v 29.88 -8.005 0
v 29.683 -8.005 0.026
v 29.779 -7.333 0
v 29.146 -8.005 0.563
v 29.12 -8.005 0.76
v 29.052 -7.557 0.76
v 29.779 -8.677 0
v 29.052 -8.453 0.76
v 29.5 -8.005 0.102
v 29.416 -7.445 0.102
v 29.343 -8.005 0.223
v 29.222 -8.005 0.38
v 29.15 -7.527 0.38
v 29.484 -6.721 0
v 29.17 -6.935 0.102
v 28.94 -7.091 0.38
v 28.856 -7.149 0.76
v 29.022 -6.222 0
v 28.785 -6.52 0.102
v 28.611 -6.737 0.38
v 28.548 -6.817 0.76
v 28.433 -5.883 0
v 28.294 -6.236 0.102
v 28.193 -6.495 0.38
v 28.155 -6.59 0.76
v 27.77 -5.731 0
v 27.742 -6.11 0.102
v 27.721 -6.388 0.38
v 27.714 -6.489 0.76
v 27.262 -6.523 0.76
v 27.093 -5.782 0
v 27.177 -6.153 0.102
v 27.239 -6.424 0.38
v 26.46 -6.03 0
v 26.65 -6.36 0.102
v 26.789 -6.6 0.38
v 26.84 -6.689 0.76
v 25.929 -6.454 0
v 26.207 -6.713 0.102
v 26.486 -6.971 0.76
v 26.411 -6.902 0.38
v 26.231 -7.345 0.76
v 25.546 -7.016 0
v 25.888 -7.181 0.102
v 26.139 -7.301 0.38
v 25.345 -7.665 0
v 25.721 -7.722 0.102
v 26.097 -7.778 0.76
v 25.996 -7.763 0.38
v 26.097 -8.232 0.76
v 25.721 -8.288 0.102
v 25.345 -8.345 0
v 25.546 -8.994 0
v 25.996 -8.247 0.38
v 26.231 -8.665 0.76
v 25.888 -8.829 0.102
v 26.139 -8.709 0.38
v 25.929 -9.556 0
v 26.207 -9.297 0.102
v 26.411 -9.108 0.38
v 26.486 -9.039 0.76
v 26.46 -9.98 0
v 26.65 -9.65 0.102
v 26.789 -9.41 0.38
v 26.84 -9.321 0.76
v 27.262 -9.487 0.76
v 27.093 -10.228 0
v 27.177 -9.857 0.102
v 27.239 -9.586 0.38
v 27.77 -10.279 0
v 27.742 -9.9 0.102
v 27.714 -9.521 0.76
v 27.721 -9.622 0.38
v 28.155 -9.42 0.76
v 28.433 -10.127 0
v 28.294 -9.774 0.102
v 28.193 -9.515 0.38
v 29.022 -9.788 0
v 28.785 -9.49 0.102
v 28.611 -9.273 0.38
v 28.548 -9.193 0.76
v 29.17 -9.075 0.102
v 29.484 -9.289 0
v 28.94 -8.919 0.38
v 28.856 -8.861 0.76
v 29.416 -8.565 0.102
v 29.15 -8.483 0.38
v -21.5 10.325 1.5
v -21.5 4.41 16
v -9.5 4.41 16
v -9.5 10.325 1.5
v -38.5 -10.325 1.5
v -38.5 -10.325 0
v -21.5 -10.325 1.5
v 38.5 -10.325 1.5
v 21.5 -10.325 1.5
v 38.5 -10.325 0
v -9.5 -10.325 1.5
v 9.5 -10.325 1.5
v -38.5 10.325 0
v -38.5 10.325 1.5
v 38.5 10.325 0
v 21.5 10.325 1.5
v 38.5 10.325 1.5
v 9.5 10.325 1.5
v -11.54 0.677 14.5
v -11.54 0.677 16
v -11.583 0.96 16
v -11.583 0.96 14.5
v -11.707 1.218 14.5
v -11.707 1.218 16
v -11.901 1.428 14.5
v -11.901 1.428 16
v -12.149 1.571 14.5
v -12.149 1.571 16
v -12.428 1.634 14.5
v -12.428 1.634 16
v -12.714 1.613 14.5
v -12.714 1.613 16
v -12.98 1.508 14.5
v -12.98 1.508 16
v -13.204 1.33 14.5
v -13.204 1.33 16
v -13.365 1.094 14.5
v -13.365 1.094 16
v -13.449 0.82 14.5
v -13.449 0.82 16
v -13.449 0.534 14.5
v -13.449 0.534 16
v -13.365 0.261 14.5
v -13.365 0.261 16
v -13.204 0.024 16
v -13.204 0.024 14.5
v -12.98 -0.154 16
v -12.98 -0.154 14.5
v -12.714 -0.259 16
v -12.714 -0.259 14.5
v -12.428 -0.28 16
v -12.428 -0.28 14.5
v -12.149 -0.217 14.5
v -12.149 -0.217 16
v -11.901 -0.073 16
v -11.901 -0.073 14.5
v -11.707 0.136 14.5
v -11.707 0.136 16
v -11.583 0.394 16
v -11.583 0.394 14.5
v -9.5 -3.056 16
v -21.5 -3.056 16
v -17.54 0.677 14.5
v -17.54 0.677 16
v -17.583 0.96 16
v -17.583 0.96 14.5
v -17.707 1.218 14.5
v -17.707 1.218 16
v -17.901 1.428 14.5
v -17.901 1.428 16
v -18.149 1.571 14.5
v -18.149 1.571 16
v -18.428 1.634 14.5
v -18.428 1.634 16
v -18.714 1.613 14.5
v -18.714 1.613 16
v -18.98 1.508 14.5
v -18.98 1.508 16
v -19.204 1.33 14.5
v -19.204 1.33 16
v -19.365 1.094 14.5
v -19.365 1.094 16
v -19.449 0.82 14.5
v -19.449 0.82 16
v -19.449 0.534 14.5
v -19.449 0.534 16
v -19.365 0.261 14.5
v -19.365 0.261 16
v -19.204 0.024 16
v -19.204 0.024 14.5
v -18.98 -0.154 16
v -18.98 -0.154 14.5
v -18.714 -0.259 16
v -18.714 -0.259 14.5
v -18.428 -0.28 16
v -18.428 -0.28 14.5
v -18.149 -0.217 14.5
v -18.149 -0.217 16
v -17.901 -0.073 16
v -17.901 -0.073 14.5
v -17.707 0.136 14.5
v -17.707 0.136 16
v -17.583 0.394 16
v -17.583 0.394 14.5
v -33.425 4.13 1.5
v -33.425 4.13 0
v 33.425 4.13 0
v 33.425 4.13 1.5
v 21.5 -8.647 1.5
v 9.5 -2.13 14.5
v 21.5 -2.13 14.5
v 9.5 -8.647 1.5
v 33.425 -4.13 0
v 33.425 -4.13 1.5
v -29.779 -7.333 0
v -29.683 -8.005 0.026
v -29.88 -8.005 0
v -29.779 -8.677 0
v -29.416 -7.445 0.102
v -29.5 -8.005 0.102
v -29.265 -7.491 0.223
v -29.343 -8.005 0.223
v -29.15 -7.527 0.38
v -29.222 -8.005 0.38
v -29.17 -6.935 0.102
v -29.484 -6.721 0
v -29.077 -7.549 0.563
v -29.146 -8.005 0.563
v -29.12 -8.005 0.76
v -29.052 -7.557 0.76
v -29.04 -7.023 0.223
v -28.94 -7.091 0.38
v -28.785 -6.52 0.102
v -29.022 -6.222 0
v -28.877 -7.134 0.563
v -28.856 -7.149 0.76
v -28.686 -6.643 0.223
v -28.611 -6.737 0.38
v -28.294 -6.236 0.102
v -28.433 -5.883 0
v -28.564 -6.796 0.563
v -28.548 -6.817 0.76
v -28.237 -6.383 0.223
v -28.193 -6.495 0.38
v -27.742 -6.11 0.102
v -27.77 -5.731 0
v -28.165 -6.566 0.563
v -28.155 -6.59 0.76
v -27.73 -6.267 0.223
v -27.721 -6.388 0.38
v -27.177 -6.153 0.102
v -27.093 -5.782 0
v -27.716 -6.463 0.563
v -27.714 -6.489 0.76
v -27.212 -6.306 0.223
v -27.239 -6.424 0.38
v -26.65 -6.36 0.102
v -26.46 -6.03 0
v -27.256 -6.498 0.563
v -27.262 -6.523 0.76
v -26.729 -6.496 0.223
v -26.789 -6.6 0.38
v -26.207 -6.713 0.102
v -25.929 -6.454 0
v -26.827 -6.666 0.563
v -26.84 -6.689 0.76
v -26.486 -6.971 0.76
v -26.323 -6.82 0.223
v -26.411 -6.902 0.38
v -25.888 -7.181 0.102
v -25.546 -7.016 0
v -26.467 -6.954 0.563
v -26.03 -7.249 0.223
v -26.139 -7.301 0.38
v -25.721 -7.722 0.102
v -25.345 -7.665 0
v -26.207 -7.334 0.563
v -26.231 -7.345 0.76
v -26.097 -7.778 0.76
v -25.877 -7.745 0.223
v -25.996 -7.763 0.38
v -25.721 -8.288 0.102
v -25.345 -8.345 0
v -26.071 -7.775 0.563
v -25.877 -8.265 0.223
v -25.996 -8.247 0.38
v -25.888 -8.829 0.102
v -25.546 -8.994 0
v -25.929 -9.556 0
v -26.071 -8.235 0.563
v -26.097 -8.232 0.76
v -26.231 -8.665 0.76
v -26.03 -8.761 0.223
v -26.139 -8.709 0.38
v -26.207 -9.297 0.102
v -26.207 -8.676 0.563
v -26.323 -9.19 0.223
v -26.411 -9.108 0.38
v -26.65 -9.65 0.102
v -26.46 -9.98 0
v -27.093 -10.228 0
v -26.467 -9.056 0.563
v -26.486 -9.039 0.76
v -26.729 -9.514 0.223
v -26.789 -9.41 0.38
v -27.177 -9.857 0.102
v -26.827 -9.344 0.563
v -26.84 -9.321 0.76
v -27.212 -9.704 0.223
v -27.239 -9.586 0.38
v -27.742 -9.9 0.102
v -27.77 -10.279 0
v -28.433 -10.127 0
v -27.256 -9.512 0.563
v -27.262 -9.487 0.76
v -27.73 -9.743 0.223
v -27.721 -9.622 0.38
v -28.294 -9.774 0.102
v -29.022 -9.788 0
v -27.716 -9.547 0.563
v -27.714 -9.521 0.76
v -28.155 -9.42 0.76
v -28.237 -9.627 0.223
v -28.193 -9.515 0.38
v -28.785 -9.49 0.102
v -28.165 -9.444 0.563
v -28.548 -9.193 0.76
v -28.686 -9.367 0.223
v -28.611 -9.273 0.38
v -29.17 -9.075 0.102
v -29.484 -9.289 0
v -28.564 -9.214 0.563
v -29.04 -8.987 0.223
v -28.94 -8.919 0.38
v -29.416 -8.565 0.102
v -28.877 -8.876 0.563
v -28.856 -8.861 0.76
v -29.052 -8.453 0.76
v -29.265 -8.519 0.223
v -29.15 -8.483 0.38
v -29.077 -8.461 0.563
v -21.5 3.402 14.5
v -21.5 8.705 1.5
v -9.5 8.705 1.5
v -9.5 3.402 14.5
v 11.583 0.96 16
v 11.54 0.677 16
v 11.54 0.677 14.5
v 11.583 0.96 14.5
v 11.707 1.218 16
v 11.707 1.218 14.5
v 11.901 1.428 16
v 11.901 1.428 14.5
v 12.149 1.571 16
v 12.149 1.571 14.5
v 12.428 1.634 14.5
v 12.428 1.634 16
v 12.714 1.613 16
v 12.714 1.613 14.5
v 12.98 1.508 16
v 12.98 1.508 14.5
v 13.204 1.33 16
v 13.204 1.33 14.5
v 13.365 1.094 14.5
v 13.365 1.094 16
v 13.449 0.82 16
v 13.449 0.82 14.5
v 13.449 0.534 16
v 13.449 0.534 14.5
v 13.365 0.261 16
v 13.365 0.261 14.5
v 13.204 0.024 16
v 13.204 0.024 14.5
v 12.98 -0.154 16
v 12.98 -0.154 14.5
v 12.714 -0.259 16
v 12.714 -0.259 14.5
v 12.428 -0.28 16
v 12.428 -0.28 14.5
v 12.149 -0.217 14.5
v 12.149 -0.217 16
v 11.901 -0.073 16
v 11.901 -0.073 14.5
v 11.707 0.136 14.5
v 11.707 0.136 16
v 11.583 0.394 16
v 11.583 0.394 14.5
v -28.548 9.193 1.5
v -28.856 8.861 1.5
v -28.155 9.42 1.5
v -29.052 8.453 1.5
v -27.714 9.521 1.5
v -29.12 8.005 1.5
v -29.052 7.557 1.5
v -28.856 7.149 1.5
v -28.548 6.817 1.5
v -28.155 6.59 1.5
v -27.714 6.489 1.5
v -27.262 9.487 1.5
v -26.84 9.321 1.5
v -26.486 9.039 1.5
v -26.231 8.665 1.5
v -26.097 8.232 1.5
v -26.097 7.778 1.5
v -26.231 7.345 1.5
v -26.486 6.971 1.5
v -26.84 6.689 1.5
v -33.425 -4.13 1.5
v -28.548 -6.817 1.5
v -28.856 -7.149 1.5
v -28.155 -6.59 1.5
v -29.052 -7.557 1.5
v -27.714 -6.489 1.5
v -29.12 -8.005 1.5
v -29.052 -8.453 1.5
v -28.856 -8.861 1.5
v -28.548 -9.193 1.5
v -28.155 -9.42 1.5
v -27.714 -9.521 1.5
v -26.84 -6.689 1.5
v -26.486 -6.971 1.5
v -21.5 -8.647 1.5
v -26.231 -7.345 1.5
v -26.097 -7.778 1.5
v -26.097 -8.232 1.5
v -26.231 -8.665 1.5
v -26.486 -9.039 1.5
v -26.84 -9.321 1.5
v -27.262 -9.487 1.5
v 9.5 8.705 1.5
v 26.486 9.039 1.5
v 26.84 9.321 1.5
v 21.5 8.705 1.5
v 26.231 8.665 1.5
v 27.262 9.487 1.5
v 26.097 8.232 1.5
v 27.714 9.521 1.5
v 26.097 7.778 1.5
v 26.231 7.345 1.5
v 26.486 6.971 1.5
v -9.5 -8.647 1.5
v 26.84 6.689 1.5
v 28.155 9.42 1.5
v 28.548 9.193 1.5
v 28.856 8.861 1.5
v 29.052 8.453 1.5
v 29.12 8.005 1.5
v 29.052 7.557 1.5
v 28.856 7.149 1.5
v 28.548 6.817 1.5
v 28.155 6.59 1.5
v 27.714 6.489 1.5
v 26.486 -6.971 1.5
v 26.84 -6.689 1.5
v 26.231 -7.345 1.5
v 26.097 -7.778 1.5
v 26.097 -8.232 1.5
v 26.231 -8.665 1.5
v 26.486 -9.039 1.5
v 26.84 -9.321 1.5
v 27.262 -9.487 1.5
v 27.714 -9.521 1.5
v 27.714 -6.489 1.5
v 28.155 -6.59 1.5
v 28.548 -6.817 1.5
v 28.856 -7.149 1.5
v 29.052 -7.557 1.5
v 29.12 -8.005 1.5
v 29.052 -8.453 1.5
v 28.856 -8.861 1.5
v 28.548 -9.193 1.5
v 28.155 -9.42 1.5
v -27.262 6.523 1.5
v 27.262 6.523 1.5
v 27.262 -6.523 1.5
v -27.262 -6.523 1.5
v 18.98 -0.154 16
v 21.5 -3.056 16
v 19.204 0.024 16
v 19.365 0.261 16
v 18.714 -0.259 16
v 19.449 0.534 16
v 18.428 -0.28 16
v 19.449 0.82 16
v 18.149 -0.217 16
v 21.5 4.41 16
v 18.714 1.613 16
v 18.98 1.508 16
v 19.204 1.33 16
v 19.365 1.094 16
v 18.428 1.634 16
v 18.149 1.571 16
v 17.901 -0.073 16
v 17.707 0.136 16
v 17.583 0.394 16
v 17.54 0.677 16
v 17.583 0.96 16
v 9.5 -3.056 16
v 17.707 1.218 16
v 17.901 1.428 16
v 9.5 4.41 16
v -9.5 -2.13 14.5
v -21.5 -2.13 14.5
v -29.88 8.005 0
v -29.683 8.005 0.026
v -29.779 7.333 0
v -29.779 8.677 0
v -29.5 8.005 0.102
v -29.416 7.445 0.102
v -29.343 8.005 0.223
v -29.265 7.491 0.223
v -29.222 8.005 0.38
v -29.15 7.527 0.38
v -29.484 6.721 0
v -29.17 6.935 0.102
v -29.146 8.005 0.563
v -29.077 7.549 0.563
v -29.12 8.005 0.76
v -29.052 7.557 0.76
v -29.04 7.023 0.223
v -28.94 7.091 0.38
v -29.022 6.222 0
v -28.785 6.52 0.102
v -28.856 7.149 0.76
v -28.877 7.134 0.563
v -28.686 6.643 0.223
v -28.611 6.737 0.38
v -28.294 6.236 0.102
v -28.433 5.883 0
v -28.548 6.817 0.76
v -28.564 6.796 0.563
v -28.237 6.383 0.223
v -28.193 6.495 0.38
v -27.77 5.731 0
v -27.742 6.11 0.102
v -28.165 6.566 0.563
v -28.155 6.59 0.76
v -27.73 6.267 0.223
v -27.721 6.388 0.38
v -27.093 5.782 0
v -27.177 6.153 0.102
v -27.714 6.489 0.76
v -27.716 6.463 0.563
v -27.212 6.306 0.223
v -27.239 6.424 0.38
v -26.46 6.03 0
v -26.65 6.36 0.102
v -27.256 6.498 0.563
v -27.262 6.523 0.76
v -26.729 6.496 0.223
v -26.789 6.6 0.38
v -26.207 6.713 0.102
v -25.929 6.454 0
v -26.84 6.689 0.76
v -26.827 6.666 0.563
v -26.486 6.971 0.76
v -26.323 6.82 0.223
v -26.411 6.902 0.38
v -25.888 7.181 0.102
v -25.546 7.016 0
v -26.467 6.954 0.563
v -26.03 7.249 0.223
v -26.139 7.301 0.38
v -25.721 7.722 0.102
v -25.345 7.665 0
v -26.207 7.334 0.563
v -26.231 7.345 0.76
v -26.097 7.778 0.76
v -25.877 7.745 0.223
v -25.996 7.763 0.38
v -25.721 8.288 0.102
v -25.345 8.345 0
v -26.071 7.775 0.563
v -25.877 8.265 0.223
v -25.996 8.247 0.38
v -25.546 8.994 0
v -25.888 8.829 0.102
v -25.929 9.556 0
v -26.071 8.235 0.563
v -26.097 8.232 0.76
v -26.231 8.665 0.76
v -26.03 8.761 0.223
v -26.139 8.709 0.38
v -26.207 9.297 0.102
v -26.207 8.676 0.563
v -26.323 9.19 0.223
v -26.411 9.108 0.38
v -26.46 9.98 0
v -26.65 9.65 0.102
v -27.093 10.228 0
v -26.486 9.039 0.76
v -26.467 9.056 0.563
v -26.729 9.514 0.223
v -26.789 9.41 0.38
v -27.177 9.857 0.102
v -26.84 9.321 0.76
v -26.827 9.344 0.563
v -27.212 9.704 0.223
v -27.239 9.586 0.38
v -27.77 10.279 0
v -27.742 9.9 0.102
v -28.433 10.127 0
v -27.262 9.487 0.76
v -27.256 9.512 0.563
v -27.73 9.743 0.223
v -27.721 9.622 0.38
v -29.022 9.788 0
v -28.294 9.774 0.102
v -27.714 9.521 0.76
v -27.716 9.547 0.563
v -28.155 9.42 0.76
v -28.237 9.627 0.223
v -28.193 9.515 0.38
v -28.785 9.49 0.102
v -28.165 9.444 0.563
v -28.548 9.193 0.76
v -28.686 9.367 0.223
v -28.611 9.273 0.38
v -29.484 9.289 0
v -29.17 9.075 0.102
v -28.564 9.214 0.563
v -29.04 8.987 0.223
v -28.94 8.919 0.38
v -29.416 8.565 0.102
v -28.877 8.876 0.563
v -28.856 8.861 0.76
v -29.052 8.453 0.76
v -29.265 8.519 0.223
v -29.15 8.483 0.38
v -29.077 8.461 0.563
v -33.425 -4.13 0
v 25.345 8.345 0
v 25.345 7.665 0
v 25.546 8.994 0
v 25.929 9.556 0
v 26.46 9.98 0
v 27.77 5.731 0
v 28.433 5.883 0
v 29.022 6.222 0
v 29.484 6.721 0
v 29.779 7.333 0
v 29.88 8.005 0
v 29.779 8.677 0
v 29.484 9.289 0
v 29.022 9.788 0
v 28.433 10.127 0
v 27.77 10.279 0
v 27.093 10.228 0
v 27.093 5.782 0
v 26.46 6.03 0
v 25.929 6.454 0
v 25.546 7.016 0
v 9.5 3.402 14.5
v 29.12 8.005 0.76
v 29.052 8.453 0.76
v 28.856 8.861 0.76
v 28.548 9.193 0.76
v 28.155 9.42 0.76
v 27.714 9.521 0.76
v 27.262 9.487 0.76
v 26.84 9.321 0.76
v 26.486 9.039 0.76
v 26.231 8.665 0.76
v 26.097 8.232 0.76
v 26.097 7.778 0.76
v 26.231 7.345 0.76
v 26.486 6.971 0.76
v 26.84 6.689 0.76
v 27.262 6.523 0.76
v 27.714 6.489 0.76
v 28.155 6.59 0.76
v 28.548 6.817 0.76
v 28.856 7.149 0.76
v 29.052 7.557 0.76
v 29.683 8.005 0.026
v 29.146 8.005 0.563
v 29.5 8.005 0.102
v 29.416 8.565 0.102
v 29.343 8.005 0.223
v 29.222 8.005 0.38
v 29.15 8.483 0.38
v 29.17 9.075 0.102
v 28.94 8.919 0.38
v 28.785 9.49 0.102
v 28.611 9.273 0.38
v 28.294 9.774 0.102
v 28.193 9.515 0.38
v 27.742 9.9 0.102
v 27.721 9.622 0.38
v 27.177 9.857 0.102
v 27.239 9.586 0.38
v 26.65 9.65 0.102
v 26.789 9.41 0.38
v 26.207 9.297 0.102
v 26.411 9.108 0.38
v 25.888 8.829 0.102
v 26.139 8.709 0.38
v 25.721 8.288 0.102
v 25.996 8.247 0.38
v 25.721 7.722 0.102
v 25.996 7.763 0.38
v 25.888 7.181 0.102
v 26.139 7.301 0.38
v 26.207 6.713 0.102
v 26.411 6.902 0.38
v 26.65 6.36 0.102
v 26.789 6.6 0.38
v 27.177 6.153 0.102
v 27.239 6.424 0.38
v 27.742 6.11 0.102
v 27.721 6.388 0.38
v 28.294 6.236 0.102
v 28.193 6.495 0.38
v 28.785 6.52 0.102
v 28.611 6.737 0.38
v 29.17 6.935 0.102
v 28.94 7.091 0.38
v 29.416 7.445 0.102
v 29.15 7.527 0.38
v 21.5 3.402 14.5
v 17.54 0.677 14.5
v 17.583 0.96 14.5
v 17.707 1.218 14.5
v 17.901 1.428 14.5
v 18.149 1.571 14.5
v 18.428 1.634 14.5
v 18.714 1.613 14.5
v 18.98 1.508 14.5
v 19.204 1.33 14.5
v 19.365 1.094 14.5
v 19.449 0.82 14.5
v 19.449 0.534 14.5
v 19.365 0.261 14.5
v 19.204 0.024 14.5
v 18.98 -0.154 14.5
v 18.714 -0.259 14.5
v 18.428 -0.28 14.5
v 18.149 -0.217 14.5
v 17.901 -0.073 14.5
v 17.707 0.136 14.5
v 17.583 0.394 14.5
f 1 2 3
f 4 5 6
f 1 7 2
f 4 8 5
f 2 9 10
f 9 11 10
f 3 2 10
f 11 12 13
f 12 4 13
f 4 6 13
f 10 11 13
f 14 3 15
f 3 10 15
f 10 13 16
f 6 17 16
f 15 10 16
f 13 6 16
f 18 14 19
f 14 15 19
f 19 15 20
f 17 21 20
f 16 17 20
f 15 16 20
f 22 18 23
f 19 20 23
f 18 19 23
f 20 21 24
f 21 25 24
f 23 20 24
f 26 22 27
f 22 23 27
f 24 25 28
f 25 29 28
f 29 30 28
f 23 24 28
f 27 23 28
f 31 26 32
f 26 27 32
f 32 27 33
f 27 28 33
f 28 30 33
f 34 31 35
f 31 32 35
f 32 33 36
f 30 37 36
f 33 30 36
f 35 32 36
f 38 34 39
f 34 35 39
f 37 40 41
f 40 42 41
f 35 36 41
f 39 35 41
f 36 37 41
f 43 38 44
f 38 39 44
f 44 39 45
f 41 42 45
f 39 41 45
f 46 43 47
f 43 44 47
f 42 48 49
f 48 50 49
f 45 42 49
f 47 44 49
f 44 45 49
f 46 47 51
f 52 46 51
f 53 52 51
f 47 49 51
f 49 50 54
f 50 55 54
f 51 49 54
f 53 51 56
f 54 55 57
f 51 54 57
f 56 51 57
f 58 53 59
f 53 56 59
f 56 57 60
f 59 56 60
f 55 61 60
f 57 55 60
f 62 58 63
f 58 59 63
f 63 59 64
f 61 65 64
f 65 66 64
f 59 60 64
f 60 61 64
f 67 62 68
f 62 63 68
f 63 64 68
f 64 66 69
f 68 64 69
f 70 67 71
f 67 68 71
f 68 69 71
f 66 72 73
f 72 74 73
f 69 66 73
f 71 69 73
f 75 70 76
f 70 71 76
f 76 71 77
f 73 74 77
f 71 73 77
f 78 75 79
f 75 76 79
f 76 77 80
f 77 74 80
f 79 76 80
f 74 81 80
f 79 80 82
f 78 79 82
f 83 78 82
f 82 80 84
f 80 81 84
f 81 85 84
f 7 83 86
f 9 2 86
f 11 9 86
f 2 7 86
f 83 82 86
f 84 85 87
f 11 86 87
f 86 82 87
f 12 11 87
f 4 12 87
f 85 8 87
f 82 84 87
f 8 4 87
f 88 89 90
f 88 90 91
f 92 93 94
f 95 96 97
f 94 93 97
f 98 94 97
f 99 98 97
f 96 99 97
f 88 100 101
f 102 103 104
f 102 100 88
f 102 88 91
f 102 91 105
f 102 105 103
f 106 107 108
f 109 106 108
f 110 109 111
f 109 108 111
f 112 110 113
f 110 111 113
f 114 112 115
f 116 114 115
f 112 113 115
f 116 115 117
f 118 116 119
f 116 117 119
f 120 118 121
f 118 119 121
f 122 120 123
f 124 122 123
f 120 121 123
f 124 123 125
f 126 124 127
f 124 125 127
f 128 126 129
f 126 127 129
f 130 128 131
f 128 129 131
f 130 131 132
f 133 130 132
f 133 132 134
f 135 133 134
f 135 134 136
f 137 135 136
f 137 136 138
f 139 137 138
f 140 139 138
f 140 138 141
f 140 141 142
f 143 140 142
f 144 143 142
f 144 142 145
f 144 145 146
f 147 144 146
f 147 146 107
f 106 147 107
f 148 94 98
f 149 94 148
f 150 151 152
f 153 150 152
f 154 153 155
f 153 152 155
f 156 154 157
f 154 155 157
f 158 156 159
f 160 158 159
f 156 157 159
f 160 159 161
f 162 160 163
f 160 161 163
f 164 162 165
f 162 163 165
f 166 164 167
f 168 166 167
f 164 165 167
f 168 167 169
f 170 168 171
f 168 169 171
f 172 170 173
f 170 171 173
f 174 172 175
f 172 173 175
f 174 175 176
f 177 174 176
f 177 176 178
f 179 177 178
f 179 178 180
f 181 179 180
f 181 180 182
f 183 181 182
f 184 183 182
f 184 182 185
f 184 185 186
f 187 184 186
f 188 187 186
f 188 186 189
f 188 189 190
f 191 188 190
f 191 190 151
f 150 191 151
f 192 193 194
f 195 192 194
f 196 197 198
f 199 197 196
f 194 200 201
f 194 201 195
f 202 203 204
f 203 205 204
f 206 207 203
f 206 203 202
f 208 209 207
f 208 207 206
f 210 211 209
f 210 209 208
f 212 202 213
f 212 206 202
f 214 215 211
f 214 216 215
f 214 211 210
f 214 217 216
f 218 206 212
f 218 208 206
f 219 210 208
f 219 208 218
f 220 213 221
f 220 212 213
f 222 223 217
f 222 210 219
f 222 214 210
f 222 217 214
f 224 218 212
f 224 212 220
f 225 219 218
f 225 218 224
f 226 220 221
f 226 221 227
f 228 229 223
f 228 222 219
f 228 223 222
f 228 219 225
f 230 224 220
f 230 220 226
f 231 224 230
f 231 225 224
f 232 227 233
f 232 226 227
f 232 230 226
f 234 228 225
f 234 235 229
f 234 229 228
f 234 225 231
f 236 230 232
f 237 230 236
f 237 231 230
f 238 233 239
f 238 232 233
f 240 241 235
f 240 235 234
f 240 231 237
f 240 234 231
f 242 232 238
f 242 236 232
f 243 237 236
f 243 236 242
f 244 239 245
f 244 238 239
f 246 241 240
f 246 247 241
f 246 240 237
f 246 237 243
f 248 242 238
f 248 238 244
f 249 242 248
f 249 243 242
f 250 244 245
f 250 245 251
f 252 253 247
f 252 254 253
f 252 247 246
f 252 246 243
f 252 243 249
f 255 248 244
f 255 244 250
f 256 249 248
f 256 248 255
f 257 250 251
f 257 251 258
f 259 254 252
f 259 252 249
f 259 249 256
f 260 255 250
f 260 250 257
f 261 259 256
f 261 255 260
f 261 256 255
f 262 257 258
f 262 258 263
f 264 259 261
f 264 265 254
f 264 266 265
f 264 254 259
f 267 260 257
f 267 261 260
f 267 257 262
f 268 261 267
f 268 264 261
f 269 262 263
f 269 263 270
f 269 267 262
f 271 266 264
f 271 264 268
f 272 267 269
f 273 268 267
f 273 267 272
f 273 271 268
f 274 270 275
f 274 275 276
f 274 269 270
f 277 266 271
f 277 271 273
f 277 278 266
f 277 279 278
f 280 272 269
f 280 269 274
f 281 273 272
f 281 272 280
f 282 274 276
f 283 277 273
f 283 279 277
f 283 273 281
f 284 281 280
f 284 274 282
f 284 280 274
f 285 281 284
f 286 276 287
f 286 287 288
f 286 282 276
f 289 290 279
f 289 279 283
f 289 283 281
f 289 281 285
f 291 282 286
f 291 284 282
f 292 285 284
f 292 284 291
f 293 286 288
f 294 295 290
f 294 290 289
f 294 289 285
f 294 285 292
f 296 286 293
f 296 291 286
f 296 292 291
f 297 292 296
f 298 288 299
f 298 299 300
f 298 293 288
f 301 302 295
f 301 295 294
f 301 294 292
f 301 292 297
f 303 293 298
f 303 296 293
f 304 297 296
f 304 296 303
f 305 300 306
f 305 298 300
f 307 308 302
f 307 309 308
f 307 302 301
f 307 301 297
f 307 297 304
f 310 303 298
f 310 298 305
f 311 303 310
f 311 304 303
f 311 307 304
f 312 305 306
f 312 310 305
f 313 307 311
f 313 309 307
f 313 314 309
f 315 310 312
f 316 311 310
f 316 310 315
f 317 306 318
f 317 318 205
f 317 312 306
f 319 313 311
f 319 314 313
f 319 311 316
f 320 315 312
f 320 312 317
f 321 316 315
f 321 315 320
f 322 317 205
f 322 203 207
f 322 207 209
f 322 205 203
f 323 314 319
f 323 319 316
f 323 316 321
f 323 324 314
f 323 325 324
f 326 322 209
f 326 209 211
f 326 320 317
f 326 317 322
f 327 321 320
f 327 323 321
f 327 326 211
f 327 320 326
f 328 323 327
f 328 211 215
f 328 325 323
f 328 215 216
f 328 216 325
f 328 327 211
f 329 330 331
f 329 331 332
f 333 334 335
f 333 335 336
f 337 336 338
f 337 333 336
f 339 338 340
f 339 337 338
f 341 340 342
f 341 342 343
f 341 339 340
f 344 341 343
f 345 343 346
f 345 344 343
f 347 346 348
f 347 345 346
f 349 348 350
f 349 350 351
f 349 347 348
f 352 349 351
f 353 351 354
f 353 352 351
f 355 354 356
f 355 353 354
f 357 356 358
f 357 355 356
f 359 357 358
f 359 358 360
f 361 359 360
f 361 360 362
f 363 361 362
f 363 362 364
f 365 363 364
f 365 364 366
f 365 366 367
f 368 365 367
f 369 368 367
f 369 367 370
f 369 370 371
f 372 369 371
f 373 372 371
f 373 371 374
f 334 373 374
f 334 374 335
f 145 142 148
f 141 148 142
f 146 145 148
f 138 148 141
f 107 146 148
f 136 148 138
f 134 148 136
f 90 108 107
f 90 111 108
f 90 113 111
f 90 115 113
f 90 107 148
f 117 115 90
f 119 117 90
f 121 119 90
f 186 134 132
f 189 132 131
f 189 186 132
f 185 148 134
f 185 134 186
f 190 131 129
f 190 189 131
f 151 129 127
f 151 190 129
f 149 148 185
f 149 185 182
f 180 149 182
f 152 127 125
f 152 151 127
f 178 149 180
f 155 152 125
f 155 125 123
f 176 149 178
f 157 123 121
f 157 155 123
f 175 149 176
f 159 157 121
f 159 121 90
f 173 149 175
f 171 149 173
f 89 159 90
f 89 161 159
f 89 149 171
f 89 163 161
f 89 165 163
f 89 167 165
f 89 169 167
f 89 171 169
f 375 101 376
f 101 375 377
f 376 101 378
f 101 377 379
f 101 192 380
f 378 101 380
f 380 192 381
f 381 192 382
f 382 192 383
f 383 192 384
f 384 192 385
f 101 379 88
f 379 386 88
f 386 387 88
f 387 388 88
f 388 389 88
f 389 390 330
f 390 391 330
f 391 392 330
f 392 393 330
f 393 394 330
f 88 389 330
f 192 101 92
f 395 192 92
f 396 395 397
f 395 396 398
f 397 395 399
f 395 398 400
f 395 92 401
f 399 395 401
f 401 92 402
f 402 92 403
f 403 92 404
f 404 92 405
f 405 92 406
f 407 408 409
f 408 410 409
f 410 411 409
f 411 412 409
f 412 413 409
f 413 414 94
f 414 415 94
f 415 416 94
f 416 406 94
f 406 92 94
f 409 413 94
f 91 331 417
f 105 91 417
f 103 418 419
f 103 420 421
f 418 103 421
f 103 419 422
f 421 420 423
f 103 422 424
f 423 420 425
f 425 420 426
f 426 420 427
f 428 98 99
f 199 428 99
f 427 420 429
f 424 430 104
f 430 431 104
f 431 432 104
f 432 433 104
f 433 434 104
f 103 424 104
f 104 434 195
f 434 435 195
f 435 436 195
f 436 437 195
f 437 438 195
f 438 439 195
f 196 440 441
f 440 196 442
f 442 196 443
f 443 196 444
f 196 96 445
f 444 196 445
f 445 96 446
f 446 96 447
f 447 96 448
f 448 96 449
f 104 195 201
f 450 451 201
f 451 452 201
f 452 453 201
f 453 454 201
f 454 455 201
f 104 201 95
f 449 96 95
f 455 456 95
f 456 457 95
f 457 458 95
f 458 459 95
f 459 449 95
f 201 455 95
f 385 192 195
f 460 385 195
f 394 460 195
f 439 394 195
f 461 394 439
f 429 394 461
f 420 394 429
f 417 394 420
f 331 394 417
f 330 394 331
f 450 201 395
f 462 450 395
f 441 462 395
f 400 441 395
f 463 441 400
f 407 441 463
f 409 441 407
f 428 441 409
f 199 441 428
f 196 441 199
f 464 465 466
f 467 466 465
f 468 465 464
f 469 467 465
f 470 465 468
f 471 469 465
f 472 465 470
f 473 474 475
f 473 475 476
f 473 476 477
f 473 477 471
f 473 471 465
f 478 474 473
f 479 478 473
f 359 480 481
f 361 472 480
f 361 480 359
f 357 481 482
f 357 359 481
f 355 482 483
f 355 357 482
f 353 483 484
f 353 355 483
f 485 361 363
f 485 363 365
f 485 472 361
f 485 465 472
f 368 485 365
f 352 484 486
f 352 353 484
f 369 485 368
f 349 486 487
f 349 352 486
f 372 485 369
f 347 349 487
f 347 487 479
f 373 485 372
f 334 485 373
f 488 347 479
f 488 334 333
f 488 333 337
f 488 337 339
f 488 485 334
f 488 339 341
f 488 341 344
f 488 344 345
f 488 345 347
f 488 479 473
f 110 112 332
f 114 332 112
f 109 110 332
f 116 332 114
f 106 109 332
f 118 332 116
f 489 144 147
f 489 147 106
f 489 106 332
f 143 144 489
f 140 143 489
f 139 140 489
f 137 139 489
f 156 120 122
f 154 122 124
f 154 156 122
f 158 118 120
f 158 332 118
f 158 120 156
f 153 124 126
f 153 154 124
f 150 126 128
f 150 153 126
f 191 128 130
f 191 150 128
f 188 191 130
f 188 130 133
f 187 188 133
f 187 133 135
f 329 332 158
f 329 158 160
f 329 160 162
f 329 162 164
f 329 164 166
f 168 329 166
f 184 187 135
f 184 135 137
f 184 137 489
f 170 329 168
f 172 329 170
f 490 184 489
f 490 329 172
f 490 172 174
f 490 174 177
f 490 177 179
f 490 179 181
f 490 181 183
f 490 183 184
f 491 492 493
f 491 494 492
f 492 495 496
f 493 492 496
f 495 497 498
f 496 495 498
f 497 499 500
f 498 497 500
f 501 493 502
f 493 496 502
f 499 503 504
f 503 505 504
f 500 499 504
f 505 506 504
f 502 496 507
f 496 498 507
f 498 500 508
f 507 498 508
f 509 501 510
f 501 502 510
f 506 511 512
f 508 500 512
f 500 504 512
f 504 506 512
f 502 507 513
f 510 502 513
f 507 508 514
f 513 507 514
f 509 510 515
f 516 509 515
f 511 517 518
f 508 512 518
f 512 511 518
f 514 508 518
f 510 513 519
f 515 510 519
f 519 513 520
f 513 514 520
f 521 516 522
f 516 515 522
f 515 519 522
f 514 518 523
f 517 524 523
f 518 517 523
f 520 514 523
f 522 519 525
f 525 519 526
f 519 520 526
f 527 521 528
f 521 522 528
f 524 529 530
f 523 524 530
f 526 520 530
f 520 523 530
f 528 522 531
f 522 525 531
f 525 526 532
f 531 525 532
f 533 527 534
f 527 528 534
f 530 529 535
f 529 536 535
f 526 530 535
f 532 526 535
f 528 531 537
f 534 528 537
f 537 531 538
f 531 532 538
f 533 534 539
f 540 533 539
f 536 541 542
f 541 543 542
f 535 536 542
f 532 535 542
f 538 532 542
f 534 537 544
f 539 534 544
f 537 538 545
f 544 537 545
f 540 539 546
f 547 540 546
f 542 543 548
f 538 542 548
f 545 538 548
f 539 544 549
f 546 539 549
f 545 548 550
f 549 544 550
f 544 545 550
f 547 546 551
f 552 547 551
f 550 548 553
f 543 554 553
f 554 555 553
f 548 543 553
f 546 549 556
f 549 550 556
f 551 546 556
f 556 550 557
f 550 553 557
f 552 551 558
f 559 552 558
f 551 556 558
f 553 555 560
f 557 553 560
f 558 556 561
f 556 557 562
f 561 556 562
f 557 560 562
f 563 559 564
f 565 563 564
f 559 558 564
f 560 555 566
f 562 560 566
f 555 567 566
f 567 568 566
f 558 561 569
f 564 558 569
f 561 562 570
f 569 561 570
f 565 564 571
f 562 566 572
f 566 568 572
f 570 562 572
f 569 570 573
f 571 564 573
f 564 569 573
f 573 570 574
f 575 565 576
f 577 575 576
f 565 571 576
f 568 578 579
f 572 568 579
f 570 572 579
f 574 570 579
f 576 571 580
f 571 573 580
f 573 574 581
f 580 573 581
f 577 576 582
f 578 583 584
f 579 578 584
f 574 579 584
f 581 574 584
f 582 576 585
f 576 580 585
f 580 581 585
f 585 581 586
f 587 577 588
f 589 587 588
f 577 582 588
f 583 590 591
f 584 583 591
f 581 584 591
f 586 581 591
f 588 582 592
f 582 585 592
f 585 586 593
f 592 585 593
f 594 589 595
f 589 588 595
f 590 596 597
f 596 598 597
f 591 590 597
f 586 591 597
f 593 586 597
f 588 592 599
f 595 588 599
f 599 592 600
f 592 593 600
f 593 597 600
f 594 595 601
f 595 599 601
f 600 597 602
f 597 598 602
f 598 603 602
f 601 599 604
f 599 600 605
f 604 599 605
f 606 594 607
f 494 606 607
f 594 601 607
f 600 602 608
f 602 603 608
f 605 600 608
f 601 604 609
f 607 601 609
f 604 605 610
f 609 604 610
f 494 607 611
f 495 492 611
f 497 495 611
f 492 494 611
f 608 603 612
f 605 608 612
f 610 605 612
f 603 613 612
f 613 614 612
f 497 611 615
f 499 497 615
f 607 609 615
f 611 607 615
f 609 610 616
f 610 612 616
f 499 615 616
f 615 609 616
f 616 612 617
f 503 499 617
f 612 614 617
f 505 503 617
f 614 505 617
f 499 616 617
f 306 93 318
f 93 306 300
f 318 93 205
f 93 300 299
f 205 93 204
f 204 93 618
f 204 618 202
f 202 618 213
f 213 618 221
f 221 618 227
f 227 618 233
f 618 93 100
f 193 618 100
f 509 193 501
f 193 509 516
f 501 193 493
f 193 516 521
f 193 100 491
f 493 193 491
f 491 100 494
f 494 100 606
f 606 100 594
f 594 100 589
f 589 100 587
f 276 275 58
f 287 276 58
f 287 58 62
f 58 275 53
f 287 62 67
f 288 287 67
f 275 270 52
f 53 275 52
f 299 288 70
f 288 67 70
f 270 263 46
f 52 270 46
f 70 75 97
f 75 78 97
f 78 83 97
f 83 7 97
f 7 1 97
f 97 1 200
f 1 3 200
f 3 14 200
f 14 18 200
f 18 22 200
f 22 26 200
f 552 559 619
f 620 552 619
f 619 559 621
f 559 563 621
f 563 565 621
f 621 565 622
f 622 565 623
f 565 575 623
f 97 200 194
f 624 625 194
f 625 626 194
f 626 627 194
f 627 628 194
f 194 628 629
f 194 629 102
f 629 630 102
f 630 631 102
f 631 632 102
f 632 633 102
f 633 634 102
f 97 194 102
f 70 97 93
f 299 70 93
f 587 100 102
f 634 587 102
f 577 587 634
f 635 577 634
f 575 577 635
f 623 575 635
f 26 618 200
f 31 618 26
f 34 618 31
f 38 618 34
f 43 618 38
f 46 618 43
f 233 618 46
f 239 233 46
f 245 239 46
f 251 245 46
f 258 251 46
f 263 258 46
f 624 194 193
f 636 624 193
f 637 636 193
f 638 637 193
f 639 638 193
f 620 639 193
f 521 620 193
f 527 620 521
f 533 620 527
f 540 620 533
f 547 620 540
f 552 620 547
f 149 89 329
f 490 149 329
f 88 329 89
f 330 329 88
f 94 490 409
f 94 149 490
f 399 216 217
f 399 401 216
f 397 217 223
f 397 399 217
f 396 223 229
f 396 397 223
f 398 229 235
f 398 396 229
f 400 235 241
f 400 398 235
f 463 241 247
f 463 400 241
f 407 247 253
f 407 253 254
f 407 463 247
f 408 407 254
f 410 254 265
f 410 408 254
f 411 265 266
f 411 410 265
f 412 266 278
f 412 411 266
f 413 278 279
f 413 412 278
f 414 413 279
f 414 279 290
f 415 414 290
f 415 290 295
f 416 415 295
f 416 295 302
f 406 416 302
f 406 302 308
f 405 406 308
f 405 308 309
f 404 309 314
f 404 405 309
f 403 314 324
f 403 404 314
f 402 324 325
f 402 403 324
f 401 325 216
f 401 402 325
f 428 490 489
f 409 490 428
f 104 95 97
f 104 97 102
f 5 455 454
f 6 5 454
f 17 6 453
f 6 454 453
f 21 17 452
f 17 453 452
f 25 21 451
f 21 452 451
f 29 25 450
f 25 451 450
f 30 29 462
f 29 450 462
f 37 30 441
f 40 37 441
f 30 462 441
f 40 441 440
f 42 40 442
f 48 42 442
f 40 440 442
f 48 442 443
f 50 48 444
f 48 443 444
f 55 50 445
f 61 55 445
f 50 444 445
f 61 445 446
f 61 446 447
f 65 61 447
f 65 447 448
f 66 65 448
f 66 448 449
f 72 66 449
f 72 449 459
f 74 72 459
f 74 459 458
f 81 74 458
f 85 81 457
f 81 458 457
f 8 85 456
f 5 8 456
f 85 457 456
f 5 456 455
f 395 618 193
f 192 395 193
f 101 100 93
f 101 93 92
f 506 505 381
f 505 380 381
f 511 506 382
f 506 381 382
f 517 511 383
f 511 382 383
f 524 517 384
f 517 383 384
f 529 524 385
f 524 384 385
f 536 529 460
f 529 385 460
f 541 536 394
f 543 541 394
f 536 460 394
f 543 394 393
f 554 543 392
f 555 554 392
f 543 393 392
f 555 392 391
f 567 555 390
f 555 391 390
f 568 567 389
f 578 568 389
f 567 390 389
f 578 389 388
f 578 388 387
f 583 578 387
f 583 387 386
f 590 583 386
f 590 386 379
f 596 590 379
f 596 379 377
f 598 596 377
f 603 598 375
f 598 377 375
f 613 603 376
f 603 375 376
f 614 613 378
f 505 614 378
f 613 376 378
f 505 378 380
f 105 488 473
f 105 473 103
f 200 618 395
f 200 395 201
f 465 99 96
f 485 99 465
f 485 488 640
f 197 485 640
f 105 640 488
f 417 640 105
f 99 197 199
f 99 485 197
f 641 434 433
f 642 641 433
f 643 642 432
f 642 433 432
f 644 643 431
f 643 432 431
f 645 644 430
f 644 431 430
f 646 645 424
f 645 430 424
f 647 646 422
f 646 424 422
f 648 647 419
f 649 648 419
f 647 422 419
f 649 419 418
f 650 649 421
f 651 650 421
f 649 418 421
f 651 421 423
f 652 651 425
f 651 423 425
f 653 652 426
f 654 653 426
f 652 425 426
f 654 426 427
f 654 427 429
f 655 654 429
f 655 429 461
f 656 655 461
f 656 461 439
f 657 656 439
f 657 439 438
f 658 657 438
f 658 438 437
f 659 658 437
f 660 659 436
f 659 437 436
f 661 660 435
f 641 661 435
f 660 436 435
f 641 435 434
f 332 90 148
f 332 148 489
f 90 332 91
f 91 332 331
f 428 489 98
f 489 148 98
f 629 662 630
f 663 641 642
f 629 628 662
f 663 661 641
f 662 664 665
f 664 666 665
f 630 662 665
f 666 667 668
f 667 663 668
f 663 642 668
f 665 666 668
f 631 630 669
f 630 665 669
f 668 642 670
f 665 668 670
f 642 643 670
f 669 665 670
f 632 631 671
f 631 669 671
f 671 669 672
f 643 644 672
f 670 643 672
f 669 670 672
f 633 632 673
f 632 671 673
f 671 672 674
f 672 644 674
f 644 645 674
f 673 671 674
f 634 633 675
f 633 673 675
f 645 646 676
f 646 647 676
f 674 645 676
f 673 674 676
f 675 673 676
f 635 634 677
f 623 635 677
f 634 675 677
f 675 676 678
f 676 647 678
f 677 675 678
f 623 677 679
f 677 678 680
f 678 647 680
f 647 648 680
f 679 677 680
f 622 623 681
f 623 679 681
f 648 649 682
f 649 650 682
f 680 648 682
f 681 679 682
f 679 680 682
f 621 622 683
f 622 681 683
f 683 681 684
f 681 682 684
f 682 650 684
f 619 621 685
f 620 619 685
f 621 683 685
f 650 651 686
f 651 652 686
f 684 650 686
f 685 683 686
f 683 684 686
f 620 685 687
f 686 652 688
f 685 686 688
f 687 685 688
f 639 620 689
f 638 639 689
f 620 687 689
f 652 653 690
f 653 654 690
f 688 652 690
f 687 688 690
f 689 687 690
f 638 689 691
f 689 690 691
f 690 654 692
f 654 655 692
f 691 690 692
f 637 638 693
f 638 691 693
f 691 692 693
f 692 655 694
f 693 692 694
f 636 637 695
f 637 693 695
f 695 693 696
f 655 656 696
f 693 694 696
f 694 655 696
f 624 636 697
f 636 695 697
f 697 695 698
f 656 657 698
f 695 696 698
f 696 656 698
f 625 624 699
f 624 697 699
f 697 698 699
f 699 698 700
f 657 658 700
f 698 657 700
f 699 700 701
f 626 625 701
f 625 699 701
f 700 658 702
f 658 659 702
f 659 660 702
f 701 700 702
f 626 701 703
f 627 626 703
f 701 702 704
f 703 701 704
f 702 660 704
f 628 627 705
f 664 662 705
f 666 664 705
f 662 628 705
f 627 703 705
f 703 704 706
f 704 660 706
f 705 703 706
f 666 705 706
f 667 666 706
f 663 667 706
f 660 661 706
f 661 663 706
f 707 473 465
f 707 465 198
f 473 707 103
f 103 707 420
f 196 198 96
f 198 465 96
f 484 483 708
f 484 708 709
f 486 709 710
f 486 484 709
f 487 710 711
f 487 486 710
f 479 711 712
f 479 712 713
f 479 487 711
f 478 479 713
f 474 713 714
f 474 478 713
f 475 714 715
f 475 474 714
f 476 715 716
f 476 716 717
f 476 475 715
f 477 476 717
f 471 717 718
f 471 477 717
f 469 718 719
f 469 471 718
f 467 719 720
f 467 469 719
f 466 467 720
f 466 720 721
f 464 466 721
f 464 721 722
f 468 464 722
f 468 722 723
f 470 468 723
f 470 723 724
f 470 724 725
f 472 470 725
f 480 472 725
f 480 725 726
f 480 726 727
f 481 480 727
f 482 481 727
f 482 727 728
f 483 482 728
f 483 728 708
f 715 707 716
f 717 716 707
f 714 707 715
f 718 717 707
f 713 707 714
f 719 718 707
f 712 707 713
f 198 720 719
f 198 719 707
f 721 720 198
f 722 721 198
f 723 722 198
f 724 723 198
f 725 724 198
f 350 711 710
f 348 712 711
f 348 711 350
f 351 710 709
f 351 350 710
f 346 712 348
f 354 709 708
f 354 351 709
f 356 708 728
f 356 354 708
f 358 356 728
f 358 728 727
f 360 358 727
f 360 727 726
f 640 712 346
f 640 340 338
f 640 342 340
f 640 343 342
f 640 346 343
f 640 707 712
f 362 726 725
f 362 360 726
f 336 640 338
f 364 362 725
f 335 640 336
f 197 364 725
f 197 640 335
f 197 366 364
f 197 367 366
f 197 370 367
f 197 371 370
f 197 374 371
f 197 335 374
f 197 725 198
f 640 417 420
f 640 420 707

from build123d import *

# Parameters (mm, degrees)
SKETCH1_W                      = 77
SKETCH1_H                      = 20.65
SKETCH1_W_2                    = 66.85
SKETCH1_H_2                    = 8.26
BOSS_EXTRUDE1_DEPTH            = 1.5
CUT_EXTRUDE1_REACH             = 41.889
SKETCH2_R                      = 1.52
CUT_EXTRUDE1_DIRECTION_2_DEPTH = 40.88866537
FILLET1_R                      = 0.76
FILLET1_OF_MIRROR1_R           = 0.76
BOSS_EXTRUDE2_REACH            = 79.704
CUT_EXTRUDE2_START             = -20.65
CUT_EXTRUDE2_OUTLINE_W         = 19
CUT_EXTRUDE2_OUTLINE_H         = 14.5
CUT_EXTRUDE2_OUTLINE_W_2       = 17
CUT_EXTRUDE2_DEPTH             = 20.65
CUT_EXTRUDE3_REACH             = 44.952
SKETCH5_R                      = 0.96


# Read off the part's stored shape, not the designer's step: Mirror2, Cut-Extrude2
with BuildPart() as part:
    # Sketch1 → Boss-Extrude1 (new body)
    with BuildSketch(Plane.XY):
        Rectangle(SKETCH1_W, SKETCH1_H)
        Rectangle(SKETCH1_W_2, SKETCH1_H_2, mode=Mode.SUBTRACT)
    extrude(amount=BOSS_EXTRUDE1_DEPTH)

    # Sketch2 → Cut-Extrude1 (cut, up to next)
    with BuildSketch(Plane.XY.offset(1.5), mode=Mode.PRIVATE) as cut_extrude1_sk1:
        with Locations(Location((-27.6, 8.005, 0), (0, 0, 180))):
            Circle(SKETCH2_R)
    cut_extrude1_tool1 = extrude(cut_extrude1_sk1.sketch, amount=-CUT_EXTRUDE1_REACH, mode=Mode.PRIVATE) & part.part
    cut_extrude1 = cut_extrude1_tool1.solids().sort_by_distance((-27.6, 8.005, 1.5))[0]
    add(cut_extrude1, mode=Mode.SUBTRACT)

    # Sketch2 → Cut-Extrude1 direction 2 (cut)
    with BuildSketch(Plane.XY.offset(1.5)):
        with Locations(Location((-27.6, 8.005, 0), (0, 0, 180))):
            Circle(SKETCH2_R)
    cut_extrude1_direction_2 = extrude(amount=CUT_EXTRUDE1_DIRECTION_2_DEPTH, mode=Mode.SUBTRACT)

    # Fillet1
    fillet1_edges = [part.edges().sort_by_distance(p)[0] for p in [
        (-26.08, 8.005, 0),
    ]]
    fillet(fillet1_edges, radius=FILLET1_R)

    # Mirror1: Cut-Extrude1, Cut-Extrude1 direction 2 across plane
    add(cut_extrude1.mirror(Plane.ZX), mode=Mode.SUBTRACT)
    add(cut_extrude1_direction_2.mirror(Plane.ZX), mode=Mode.SUBTRACT)

    # Fillet1 of Mirror1
    fillet1_of_mirror1_edges = [part.edges().sort_by_distance(p)[0] for p in [
        (-26.08, -8.005, 0),
    ]]
    fillet(fillet1_of_mirror1_edges, radius=FILLET1_OF_MIRROR1_R)

    # Mirror2 outline → Mirror2 (revolve, cut)
    with BuildSketch(Plane(origin=(27.6, 8.005, 0), x_dir=(1, 0, 0), z_dir=(0, -1, 0))):
        with BuildLine():
            Line((1.52, 0.76), (1.52, 1.5))
            Line((1.52, 1.5), (0, 1.5))
            Line((0, 1.5), (0, 0))
            Line((0, 0), (2.28, 0))
            ThreePointArc((2.28, 0), (1.742598846, 0.222598846), (1.52, 0.76))
        make_face()
    revolve(axis=Axis((27.6, 8.005, 0), (0, 0, 1)), mode=Mode.SUBTRACT)

    # Mirror2 2 outline → Mirror2 2 (revolve, cut)
    with BuildSketch(Plane(origin=(27.6, -8.005, 0), x_dir=(1, 0, 0), z_dir=(0, -1, 0))):
        with BuildLine():
            Line((1.52, 0.76), (1.52, 1.5))
            Line((1.52, 1.5), (0, 1.5))
            Line((0, 1.5), (0, 0))
            Line((0, 0), (2.28, 0))
            ThreePointArc((2.28, 0), (1.742598846, 0.222598846), (1.52, 0.76))
        make_face()
    revolve(axis=Axis((27.6, -8.005, 0), (0, 0, 1)), mode=Mode.SUBTRACT)

    # Boss-Extrude2: up to this face of the body (flat: up to its plane)
    boss_extrude2_end = Plane(part.part.faces().sort_by_distance((38.5, 0, 0.75))[0])
    # Sketch3 → Boss-Extrude2 (add, up to the picked face)
    with BuildSketch(Plane.ZY.offset(38.5), mode=Mode.PRIVATE) as boss_extrude2_sk1:
        Polygon((16, 4.410137364), (1.5, 10.325), (1.5, 8.705), (14.5, 3.402019706), (14.5, -2.130032078), (1.5, -8.647068966), (1.5, -10.325), (16, -3.055997317), align=None)
    boss_extrude2_tool1 = split(extrude(boss_extrude2_sk1.sketch, amount=-BOSS_EXTRUDE2_REACH, mode=Mode.PRIVATE), bisect_by=boss_extrude2_end, keep=Keep.BOTH, mode=Mode.PRIVATE)
    add(boss_extrude2_tool1.solids().sort_by(Axis((-38.5, 0.67707, 15.747676), (1, 0, 0)))[0])

    # Cut-Extrude2 outline → Cut-Extrude2 (cut)
    with BuildSketch(Plane(origin=(0, 10.325, 0), x_dir=(1, 0, 0), z_dir=(0, 1, 0)).offset(CUT_EXTRUDE2_START)):
        with Locations((0, -8.75)):
            Rectangle(CUT_EXTRUDE2_OUTLINE_W, CUT_EXTRUDE2_OUTLINE_H)
        with Locations((30, -8.75)):
            Rectangle(CUT_EXTRUDE2_OUTLINE_W_2, CUT_EXTRUDE2_OUTLINE_H)
        with Locations((-30, -8.75)):
            Rectangle(CUT_EXTRUDE2_OUTLINE_W_2, CUT_EXTRUDE2_OUTLINE_H)
    extrude(amount=CUT_EXTRUDE2_DEPTH, mode=Mode.SUBTRACT)

    # Sketch5 → Cut-Extrude3 (cut, up to next)
    with BuildSketch(Plane.XY.offset(16), mode=Mode.PRIVATE) as cut_extrude3_sk1:
        with Locations((-12.5, 0.677070023)):
            Circle(SKETCH5_R)
    cut_extrude3_tool1 = extrude(cut_extrude3_sk1.sketch, amount=-CUT_EXTRUDE3_REACH, mode=Mode.PRIVATE) & part.part
    # Sketch5 → Cut-Extrude3 (cut, up to next)
    with BuildSketch(Plane.XY.offset(16), mode=Mode.PRIVATE) as cut_extrude3_sk2:
        with Locations((-18.5, 0.677070023)):
            Circle(SKETCH5_R)
    cut_extrude3_tool2 = extrude(cut_extrude3_sk2.sketch, amount=-CUT_EXTRUDE3_REACH, mode=Mode.PRIVATE) & part.part
    cut_extrude3_1 = cut_extrude3_tool1.solids().sort_by_distance((-12.5, 0.67707, 16))[0]
    add(cut_extrude3_1, mode=Mode.SUBTRACT)
    cut_extrude3_2 = cut_extrude3_tool2.solids().sort_by_distance((-18.5, 0.67707, 16))[0]
    add(cut_extrude3_2, mode=Mode.SUBTRACT)
    cut_extrude3 = cut_extrude3_1 + cut_extrude3_2  # Cut-Extrude3 as one shape, for the pattern or mirror that repeats it

    # Mirror3: Cut-Extrude3 across plane
    add(cut_extrude3.mirror(Plane(origin=(0, 0, 0), x_dir=(0, 0, 1), z_dir=(1, 0, 0))), mode=Mode.SUBTRACT)


solid = part.part
